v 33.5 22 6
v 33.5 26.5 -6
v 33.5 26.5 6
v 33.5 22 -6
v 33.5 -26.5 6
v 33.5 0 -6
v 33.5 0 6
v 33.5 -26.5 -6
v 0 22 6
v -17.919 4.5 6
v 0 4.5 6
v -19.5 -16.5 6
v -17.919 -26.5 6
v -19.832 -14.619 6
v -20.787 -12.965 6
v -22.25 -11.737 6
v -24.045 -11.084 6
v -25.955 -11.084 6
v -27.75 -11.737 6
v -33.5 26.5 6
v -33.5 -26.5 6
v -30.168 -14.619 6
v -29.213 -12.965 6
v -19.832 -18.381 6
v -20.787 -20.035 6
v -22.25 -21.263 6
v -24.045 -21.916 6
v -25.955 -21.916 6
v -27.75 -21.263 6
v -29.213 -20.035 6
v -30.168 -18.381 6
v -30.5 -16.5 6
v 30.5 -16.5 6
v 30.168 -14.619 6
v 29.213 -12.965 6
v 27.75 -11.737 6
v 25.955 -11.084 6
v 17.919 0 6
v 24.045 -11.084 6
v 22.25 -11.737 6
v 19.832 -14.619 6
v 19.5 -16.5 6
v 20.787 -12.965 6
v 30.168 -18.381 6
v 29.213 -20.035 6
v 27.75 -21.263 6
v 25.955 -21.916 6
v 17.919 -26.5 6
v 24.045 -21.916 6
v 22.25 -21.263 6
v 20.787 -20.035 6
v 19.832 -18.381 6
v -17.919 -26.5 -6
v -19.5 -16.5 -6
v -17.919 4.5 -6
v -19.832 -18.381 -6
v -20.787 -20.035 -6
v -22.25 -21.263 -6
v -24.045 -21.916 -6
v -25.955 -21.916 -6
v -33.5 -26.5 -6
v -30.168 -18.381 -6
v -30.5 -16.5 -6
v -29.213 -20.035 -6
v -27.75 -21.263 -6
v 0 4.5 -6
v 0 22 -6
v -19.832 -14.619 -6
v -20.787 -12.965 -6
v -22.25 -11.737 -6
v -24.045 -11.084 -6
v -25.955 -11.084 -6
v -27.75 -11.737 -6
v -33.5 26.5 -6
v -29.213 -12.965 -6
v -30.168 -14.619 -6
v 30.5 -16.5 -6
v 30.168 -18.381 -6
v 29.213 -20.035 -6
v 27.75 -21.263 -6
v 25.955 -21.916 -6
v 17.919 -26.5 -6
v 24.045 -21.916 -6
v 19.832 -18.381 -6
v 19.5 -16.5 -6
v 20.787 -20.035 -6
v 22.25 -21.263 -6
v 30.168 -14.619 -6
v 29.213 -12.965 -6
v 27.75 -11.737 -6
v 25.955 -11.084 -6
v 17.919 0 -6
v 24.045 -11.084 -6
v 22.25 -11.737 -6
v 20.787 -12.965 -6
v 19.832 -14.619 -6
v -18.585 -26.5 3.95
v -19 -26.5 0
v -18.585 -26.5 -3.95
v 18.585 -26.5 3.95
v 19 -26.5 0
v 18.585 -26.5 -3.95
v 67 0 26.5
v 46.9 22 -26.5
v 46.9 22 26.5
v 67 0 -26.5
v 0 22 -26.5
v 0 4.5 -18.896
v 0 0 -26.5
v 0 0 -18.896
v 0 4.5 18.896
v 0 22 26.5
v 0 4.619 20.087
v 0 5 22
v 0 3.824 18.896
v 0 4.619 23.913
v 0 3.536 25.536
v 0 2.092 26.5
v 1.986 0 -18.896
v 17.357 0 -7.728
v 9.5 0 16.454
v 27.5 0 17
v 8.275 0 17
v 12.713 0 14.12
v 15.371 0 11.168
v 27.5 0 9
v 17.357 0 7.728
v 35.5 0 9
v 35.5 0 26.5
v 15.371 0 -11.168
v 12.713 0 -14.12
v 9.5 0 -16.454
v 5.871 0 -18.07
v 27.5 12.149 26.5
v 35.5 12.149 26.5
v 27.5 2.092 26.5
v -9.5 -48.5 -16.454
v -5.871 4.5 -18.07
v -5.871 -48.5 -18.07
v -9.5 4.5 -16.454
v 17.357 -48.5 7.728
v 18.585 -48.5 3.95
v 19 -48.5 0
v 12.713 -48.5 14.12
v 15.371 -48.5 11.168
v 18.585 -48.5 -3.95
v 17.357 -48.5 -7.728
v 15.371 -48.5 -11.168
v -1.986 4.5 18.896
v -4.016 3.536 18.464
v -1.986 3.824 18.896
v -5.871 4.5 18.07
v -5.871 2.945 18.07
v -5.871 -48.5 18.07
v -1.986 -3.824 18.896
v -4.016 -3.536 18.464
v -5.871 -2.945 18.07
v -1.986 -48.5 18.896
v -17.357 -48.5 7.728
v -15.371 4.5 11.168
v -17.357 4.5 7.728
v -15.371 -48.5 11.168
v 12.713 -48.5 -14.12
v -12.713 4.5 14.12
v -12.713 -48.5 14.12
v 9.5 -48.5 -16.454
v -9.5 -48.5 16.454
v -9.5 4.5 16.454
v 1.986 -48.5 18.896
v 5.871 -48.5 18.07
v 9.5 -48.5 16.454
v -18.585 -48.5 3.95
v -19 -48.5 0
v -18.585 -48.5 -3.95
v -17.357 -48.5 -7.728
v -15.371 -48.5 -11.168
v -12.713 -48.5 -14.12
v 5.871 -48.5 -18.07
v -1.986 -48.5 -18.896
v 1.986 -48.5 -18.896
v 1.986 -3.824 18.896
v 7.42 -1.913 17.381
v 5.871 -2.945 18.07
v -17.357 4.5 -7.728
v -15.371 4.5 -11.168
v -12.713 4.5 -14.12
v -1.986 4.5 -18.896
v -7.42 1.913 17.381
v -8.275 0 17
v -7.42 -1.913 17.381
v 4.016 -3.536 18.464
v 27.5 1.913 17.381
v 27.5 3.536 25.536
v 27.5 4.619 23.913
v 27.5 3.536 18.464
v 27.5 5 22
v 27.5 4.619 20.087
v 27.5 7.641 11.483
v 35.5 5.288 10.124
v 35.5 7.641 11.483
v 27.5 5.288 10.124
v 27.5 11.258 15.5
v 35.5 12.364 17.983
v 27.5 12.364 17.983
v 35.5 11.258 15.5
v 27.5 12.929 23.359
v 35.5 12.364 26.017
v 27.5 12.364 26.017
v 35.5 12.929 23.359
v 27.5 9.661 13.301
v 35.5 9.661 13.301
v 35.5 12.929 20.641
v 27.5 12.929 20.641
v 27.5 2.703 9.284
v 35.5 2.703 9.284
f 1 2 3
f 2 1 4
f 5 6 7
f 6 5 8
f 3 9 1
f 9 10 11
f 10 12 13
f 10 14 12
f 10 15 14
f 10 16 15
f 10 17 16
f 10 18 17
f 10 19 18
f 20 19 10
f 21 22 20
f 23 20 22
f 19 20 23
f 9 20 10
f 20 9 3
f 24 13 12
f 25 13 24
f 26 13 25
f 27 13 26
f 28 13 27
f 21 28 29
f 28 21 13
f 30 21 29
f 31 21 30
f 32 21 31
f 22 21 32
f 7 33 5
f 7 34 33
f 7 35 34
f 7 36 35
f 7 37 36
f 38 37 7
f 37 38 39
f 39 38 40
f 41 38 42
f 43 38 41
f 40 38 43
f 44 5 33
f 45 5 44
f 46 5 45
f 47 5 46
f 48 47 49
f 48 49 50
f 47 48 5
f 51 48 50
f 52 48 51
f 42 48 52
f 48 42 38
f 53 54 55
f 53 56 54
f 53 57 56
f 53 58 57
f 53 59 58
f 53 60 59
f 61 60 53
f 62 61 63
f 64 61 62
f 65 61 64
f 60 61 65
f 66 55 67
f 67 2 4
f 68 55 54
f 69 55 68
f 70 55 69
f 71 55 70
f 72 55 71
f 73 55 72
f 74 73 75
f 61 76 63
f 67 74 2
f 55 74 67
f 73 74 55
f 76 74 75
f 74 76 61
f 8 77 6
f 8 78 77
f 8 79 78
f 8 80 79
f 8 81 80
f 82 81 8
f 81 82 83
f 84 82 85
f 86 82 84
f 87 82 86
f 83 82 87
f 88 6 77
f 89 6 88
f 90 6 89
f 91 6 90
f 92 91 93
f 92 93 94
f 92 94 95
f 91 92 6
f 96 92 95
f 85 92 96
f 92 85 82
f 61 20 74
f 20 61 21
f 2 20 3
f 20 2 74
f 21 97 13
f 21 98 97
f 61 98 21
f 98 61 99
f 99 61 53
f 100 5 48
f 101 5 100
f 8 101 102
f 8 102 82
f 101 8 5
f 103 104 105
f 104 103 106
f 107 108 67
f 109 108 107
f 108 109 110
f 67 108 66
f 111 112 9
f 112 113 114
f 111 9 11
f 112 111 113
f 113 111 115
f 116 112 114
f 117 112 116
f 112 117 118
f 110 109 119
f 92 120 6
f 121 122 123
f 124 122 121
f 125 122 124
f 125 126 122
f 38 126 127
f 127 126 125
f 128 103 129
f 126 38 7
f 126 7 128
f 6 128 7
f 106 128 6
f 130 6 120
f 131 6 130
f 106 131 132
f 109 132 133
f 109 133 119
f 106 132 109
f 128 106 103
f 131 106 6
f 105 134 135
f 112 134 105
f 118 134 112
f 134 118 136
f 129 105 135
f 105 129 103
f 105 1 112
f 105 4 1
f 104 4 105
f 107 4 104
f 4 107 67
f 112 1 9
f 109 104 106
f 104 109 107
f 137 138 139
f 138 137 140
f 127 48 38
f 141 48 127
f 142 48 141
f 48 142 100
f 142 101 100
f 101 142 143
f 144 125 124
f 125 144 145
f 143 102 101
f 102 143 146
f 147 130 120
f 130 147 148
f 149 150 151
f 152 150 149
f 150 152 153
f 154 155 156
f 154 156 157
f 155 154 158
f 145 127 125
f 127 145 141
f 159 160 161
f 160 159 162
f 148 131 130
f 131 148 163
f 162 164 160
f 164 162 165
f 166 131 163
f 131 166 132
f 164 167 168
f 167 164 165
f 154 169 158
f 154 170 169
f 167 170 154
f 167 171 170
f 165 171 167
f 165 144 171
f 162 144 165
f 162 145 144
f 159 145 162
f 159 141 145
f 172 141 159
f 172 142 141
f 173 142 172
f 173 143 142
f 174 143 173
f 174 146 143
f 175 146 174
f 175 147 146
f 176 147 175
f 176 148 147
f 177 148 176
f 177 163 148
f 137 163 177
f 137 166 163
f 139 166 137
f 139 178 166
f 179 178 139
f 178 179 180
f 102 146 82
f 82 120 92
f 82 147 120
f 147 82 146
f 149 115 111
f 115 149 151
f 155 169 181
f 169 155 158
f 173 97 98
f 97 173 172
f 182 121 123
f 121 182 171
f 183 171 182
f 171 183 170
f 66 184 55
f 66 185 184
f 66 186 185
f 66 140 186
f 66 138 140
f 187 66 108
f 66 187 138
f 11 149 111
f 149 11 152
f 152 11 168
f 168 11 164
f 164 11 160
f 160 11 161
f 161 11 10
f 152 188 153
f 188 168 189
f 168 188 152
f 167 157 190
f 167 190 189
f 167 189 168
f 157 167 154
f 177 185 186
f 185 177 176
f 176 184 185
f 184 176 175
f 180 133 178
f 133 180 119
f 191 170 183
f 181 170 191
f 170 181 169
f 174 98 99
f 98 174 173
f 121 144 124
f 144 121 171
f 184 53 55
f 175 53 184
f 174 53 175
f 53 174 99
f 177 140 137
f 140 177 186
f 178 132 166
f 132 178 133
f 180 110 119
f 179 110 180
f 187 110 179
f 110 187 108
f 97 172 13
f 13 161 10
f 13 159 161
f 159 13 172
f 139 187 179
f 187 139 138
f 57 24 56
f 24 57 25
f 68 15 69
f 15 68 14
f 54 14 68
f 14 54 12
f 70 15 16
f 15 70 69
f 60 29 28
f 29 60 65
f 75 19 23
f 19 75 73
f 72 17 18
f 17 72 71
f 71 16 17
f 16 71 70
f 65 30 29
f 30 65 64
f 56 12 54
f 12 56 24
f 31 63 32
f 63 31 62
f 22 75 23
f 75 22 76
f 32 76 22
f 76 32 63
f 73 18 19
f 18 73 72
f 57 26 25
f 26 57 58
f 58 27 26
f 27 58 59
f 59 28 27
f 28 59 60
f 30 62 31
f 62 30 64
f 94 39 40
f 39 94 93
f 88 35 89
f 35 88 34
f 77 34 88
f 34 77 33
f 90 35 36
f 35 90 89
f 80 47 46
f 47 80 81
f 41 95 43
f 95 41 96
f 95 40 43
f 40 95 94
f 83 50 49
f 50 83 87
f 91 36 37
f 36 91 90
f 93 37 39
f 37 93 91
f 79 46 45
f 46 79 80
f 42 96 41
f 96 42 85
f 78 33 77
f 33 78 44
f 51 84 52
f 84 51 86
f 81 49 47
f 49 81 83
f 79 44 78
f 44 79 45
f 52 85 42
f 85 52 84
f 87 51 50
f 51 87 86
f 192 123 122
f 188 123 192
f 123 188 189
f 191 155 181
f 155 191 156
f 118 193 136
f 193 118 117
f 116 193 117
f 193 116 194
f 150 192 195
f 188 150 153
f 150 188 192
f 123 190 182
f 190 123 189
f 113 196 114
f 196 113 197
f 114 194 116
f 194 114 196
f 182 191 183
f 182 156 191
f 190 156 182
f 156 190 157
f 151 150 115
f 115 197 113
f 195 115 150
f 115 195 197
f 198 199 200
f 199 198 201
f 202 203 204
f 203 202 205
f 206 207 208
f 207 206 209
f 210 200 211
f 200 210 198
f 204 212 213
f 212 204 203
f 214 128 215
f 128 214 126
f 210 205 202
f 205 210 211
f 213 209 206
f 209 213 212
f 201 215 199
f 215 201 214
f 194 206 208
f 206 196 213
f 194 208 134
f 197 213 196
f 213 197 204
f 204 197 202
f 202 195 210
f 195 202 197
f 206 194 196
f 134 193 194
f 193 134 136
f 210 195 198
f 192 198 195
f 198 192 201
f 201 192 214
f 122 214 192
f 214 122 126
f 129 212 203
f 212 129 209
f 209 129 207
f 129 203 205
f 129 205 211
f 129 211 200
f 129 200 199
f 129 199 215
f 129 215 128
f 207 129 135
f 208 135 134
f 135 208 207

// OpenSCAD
// Parameters
shaft_diameter_mm = 10; //[5:20:0.5]
base_length_mm = 67; //[34:134:1]
base_width_mm = 53; //[27:106:1]
base_thickness_mm = 12; //[6:24:1]
housing_outer_diameter_mm = 38; //[25:60:1]
housing_length_mm = 53; //[30:90:1]
housing_center_height_mm = 28; //[18:50:1]
mounting_hole_diameter_mm = 11; //[6:16:0.5]
mounting_hole_separation_mm = 50; //[30:90:1]
mounting_hole_edge_margin_x_mm = 8.5; //[4:20:0.5]
mounting_hole_offset_y_mm = 10; //[5:20:0.5]
bearing_seat_diameter_mm = 26; //[16:45:0.5]
bearing_seat_depth_mm = 6; //[2:15:0.5]
overlap_mm = 1; //[0.5:2:0.1]

// Right Trapezoid
module right_trapezoid() {
  color("Silver") {
    linear_extrude(height=base_width_mm, center=true) {
      polygon(points=[
        [0, 0],
        [base_length_mm, 0],
        [base_length_mm * 0.70, housing_center_height_mm - base_thickness_mm / 2],
        [0, housing_center_height_mm - base_thickness_mm / 2]
      ]);
    }
  }
}

// KP Pillow Block Hole Positions
module kp_pillow_block_hole_positions() {
  color("DimGray") {
    union() {
      translate([-mounting_hole_separation_mm / 2, (-base_width_mm / 2) + mounting_hole_offset_y_mm, 0])
        cylinder(r=mounting_hole_diameter_mm / 2, h=base_thickness_mm + 2 * overlap_mm, center=true);
      translate([mounting_hole_separation_mm / 2, (-base_width_mm / 2) + mounting_hole_offset_y_mm, 0])
        cylinder(r=mounting_hole_diameter_mm / 2, h=base_thickness_mm + 2 * overlap_mm, center=true);
    }
  }
}

// KP Pillow Block
module kp_pillow_block() {
  color("Black") {
    rotate([90, 0, 0])
      translate([0, 0, (-base_thickness_mm / 2) + housing_center_height_mm])
      cylinder(r=housing_outer_diameter_mm / 2, h=housing_length_mm, center=true);
  }
}

// KP Pillow Block Assembly
module kp_pillow_block_assembly() {
  color("Silver") {
    union() {
      translate([0, 0, 0])
        cube([base_length_mm, base_width_mm, base_thickness_mm], center=true);
      right_trapezoid();
      kp_pillow_block();
    }
  }
}

// SCS Bearing Block Assembly
module scs_bearing_block_assembly() {
  color("Silver") {
    difference() {
      kp_pillow_block_assembly();
      translate([0, 0, (-base_thickness_mm / 2) + housing_center_height_mm])
        rotate([0, 90, 0])
        cylinder(r=shaft_diameter_mm / 2, h=base_length_mm + 2 * overlap_mm, center=true);
      translate([(base_length_mm / 2) - (bearing_seat_depth_mm / 2) + overlap_mm, 0, (-base_thickness_mm / 2) + housing_center_height_mm])
        rotate([0, 90, 0])
        cylinder(r=bearing_seat_diameter_mm / 2, h=bearing_seat_depth_mm + 2 * overlap_mm, center=true);
      kp_pillow_block_hole_positions();
    }
  }
}

// Final Assembly
module assembly() {
  scs_bearing_block_assembly();
}

assembly();
